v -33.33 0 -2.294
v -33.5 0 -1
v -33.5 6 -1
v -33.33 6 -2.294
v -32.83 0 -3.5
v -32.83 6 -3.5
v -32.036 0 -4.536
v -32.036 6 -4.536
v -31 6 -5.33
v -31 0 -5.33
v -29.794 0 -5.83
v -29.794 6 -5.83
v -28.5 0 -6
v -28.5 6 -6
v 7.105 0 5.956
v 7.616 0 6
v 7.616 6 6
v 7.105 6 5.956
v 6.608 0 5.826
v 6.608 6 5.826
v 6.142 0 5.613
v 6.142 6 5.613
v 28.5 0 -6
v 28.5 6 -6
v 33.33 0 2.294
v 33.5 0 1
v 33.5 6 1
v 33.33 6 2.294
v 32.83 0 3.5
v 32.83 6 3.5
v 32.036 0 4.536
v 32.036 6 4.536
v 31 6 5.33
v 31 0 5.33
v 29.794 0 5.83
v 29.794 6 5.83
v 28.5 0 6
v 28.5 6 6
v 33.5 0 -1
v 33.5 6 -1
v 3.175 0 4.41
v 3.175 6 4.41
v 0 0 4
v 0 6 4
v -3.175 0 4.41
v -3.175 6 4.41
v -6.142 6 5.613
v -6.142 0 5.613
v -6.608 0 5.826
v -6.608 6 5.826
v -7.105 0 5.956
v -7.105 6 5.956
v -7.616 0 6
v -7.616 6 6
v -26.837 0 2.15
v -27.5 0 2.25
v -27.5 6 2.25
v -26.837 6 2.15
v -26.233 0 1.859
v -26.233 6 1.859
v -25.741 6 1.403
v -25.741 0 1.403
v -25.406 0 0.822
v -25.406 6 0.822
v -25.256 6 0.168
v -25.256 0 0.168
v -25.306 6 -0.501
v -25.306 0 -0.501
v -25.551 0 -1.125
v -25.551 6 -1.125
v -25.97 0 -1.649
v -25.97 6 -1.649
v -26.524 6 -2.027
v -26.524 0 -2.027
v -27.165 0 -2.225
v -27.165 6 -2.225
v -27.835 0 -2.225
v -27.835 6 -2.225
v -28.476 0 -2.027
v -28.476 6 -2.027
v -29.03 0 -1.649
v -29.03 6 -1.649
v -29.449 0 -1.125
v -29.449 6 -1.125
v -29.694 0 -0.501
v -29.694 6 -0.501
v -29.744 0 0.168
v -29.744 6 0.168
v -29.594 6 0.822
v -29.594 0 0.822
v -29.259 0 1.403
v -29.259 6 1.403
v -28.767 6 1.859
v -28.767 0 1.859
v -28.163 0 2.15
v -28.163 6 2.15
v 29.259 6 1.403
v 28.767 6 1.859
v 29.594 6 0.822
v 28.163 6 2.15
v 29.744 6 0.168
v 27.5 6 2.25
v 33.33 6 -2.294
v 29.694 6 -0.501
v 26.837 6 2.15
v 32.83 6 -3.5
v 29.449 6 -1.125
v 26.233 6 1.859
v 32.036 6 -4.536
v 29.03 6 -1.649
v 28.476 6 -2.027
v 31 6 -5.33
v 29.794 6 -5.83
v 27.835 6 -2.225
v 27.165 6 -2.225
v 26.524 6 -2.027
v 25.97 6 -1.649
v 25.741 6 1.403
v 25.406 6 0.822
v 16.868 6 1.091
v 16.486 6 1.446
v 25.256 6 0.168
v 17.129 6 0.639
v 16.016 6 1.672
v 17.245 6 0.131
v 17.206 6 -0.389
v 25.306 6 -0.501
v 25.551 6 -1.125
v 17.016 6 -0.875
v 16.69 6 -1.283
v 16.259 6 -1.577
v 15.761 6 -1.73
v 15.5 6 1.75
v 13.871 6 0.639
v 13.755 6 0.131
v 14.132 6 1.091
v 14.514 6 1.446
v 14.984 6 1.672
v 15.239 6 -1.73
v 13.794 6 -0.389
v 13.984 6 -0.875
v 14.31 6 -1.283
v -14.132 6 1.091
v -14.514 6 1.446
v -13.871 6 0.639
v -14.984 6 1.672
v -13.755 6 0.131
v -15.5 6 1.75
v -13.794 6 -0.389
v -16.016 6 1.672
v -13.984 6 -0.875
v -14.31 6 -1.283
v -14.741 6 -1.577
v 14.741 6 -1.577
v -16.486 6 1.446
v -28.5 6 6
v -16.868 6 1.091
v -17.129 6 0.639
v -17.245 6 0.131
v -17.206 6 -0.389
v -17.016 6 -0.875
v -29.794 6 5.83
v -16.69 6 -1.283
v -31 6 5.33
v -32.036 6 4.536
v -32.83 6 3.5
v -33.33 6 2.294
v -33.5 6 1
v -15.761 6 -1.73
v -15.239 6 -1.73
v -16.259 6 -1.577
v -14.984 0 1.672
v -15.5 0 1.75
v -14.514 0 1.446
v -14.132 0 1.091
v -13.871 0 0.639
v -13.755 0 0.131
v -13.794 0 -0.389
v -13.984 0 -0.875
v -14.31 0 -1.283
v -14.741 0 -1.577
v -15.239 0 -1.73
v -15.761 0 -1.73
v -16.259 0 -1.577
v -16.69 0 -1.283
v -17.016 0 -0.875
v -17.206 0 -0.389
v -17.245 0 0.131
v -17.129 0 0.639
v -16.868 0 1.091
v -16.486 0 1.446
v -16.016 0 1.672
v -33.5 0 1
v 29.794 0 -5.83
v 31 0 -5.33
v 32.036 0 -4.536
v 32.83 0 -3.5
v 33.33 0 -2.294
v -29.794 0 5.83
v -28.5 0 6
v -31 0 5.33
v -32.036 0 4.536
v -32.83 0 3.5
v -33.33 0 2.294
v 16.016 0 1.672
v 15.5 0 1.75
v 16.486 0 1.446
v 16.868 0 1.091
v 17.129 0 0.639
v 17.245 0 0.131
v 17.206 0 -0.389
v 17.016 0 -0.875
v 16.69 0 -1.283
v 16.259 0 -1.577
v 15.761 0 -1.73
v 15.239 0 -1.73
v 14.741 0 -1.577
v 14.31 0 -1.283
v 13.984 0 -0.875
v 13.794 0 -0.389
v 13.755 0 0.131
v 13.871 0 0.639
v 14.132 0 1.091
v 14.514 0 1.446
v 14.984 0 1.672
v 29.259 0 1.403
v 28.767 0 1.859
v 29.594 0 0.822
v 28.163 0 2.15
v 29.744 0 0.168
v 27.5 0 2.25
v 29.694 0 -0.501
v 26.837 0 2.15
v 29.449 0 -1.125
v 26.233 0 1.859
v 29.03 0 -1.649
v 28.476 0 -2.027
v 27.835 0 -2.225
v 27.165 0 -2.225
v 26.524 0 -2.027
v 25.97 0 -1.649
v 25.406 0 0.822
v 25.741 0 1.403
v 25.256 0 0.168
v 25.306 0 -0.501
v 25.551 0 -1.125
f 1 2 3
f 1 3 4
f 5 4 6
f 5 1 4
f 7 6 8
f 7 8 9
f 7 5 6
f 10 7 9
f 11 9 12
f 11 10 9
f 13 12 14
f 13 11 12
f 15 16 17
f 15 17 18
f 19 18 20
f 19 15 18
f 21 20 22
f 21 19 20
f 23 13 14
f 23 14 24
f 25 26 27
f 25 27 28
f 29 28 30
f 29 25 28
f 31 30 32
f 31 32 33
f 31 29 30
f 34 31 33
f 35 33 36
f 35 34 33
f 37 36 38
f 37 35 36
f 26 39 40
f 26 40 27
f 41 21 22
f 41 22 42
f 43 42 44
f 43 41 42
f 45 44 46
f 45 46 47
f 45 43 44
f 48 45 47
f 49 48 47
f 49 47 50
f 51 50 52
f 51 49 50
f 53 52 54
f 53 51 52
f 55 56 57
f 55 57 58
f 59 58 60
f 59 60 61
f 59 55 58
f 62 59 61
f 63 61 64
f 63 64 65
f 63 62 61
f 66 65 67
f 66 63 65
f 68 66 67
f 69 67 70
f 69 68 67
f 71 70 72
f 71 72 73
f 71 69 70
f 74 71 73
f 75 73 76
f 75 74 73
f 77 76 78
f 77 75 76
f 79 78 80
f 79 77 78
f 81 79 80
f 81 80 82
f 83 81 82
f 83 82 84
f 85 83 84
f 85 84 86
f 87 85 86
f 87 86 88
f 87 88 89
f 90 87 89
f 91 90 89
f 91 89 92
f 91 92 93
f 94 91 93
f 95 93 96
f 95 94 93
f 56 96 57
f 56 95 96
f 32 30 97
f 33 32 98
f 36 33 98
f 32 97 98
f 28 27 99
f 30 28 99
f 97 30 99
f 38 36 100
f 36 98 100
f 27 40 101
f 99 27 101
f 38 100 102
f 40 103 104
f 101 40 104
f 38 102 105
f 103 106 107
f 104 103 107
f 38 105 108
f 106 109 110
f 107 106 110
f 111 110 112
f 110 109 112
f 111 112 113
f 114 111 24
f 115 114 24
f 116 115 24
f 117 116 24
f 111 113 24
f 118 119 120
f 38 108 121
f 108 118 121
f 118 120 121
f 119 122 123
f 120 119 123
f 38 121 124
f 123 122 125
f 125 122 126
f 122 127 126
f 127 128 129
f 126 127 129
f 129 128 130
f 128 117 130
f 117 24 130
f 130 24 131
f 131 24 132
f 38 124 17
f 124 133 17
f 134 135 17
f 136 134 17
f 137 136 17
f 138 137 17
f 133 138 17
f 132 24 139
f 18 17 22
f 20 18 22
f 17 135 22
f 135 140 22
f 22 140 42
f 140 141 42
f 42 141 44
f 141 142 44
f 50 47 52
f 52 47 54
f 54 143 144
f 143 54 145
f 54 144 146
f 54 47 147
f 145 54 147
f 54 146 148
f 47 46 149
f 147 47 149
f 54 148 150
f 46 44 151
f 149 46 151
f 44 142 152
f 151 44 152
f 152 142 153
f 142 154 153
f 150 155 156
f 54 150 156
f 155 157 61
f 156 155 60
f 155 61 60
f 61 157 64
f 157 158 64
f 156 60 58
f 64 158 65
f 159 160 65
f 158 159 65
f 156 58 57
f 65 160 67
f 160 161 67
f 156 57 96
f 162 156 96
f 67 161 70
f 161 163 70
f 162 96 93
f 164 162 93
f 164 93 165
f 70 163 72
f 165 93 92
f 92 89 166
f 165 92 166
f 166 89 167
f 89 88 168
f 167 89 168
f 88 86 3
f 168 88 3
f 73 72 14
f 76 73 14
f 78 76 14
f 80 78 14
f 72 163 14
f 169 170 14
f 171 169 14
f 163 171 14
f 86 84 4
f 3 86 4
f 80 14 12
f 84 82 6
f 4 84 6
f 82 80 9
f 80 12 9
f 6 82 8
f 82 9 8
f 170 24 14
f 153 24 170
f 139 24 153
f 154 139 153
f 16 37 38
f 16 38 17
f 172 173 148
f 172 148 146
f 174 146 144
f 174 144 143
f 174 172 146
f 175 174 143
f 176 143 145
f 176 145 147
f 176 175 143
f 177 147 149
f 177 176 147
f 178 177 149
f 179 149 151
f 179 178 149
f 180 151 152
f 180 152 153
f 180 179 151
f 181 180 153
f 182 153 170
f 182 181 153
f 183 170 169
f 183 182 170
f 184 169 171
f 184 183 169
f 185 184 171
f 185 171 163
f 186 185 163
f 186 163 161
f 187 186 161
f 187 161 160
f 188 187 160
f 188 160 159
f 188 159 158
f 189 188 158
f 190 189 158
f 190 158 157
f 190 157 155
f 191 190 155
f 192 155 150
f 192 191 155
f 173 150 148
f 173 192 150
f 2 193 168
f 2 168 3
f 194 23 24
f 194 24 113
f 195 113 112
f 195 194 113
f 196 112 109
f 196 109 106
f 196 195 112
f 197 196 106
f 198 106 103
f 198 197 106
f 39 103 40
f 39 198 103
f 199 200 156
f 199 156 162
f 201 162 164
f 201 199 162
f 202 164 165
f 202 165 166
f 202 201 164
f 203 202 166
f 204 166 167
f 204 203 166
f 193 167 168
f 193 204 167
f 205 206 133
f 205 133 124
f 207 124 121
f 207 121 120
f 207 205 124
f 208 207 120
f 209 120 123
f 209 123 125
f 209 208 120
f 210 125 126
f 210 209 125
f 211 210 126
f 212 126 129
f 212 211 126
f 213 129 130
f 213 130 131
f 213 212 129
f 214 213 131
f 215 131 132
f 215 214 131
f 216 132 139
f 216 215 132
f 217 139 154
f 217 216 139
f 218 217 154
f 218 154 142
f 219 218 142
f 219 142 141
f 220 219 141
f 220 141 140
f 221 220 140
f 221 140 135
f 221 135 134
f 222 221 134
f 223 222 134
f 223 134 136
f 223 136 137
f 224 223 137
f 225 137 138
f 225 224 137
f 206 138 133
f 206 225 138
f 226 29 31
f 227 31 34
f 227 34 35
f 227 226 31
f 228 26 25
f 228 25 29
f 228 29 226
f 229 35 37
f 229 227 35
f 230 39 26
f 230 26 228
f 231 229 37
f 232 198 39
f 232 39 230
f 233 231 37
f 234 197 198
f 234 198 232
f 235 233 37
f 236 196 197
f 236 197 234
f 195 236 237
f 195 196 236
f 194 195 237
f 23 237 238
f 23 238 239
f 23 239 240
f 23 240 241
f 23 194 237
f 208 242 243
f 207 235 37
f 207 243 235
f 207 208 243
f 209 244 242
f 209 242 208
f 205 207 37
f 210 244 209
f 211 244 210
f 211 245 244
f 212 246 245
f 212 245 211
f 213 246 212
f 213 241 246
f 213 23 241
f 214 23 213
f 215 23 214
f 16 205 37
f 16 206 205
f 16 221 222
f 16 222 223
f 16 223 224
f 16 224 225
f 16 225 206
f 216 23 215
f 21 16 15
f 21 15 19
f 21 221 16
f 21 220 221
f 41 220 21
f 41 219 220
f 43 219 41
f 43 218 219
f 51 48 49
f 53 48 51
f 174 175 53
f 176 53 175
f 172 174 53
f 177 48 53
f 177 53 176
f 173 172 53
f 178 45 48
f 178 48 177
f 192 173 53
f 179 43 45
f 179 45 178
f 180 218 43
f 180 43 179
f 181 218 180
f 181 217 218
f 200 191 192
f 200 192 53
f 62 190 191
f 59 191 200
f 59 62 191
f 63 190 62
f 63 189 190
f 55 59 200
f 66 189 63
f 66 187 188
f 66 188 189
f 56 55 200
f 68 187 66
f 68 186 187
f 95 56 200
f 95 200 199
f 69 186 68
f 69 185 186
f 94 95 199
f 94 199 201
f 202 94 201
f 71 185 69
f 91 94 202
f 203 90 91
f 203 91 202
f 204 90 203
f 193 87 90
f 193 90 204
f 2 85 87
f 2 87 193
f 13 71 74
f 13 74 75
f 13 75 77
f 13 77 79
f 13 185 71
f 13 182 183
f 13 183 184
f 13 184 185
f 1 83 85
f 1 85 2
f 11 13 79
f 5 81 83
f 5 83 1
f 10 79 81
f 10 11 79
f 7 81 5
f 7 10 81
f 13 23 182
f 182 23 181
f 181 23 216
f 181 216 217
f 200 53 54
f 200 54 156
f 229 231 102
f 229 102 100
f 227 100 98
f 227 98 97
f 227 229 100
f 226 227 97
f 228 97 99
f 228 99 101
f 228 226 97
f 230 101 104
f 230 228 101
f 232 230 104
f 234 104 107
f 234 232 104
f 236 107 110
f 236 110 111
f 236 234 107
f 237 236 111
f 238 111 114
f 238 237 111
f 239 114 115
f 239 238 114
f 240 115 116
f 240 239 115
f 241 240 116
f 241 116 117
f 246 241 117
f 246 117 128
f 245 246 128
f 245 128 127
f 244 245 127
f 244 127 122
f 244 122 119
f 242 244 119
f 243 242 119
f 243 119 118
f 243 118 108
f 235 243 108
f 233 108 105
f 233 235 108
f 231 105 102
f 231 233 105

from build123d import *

# Parameters (mm, degrees)
SKETCH1_R           = 1.75
SKETCH1_R_2         = 2.25
BOSS_EXTRUDE1_DEPTH = 6


with BuildPart() as part:
    # Sketch1 → Boss-Extrude1 (new body)
    with BuildSketch(Plane(origin=(0, 0, 0), x_dir=(1, 0, 0), z_dir=(0, 1, 0))):
        with BuildLine():
            Line((-28.5, 6), (28.5, 6))
            ThreePointArc((28.5, 6), (32.035533906, 4.535533906), (33.5, 1))
            Line((33.5, 1), (33.5, -1))
            ThreePointArc((33.5, -1), (32.035533906, -4.535533906), (28.5, -6))
            Line((28.5, -6), (7.615773106, -6))
            ThreePointArc((7.615773106, -6), (6.853772344, -5.901612455), (6.141752505, -5.612903226))
            ThreePointArc((6.141752505, -5.612903226), (0, -4), (-6.141752505, -5.612903226))
            ThreePointArc((-6.141752505, -5.612903226), (-6.853772344, -5.901612455), (-7.615773106, -6))
            Line((-7.615773106, -6), (-28.5, -6))
            ThreePointArc((-28.5, -6), (-32.035533906, -4.535533906), (-33.5, -1))
            Line((-33.5, -1), (-33.5, 1))
            ThreePointArc((-33.5, 1), (-32.035533906, 4.535533906), (-28.5, 6))
        make_face()
        with Locations(Location((-15.5, 0, 0), (0, 0, 270))):
            Circle(SKETCH1_R, mode=Mode.SUBTRACT)
        with Locations(Location((15.5, 0, 0), (0, 0, 270))):
            Circle(SKETCH1_R, mode=Mode.SUBTRACT)
        with Locations(Location((27.5, 0, 0), (0, 0, 270))):
            Circle(SKETCH1_R_2, mode=Mode.SUBTRACT)
        with Locations(Location((-27.5, 0, 0), (0, 0, 270))):
            Circle(SKETCH1_R_2, mode=Mode.SUBTRACT)
    extrude(amount=BOSS_EXTRUDE1_DEPTH)


solid = part.part
